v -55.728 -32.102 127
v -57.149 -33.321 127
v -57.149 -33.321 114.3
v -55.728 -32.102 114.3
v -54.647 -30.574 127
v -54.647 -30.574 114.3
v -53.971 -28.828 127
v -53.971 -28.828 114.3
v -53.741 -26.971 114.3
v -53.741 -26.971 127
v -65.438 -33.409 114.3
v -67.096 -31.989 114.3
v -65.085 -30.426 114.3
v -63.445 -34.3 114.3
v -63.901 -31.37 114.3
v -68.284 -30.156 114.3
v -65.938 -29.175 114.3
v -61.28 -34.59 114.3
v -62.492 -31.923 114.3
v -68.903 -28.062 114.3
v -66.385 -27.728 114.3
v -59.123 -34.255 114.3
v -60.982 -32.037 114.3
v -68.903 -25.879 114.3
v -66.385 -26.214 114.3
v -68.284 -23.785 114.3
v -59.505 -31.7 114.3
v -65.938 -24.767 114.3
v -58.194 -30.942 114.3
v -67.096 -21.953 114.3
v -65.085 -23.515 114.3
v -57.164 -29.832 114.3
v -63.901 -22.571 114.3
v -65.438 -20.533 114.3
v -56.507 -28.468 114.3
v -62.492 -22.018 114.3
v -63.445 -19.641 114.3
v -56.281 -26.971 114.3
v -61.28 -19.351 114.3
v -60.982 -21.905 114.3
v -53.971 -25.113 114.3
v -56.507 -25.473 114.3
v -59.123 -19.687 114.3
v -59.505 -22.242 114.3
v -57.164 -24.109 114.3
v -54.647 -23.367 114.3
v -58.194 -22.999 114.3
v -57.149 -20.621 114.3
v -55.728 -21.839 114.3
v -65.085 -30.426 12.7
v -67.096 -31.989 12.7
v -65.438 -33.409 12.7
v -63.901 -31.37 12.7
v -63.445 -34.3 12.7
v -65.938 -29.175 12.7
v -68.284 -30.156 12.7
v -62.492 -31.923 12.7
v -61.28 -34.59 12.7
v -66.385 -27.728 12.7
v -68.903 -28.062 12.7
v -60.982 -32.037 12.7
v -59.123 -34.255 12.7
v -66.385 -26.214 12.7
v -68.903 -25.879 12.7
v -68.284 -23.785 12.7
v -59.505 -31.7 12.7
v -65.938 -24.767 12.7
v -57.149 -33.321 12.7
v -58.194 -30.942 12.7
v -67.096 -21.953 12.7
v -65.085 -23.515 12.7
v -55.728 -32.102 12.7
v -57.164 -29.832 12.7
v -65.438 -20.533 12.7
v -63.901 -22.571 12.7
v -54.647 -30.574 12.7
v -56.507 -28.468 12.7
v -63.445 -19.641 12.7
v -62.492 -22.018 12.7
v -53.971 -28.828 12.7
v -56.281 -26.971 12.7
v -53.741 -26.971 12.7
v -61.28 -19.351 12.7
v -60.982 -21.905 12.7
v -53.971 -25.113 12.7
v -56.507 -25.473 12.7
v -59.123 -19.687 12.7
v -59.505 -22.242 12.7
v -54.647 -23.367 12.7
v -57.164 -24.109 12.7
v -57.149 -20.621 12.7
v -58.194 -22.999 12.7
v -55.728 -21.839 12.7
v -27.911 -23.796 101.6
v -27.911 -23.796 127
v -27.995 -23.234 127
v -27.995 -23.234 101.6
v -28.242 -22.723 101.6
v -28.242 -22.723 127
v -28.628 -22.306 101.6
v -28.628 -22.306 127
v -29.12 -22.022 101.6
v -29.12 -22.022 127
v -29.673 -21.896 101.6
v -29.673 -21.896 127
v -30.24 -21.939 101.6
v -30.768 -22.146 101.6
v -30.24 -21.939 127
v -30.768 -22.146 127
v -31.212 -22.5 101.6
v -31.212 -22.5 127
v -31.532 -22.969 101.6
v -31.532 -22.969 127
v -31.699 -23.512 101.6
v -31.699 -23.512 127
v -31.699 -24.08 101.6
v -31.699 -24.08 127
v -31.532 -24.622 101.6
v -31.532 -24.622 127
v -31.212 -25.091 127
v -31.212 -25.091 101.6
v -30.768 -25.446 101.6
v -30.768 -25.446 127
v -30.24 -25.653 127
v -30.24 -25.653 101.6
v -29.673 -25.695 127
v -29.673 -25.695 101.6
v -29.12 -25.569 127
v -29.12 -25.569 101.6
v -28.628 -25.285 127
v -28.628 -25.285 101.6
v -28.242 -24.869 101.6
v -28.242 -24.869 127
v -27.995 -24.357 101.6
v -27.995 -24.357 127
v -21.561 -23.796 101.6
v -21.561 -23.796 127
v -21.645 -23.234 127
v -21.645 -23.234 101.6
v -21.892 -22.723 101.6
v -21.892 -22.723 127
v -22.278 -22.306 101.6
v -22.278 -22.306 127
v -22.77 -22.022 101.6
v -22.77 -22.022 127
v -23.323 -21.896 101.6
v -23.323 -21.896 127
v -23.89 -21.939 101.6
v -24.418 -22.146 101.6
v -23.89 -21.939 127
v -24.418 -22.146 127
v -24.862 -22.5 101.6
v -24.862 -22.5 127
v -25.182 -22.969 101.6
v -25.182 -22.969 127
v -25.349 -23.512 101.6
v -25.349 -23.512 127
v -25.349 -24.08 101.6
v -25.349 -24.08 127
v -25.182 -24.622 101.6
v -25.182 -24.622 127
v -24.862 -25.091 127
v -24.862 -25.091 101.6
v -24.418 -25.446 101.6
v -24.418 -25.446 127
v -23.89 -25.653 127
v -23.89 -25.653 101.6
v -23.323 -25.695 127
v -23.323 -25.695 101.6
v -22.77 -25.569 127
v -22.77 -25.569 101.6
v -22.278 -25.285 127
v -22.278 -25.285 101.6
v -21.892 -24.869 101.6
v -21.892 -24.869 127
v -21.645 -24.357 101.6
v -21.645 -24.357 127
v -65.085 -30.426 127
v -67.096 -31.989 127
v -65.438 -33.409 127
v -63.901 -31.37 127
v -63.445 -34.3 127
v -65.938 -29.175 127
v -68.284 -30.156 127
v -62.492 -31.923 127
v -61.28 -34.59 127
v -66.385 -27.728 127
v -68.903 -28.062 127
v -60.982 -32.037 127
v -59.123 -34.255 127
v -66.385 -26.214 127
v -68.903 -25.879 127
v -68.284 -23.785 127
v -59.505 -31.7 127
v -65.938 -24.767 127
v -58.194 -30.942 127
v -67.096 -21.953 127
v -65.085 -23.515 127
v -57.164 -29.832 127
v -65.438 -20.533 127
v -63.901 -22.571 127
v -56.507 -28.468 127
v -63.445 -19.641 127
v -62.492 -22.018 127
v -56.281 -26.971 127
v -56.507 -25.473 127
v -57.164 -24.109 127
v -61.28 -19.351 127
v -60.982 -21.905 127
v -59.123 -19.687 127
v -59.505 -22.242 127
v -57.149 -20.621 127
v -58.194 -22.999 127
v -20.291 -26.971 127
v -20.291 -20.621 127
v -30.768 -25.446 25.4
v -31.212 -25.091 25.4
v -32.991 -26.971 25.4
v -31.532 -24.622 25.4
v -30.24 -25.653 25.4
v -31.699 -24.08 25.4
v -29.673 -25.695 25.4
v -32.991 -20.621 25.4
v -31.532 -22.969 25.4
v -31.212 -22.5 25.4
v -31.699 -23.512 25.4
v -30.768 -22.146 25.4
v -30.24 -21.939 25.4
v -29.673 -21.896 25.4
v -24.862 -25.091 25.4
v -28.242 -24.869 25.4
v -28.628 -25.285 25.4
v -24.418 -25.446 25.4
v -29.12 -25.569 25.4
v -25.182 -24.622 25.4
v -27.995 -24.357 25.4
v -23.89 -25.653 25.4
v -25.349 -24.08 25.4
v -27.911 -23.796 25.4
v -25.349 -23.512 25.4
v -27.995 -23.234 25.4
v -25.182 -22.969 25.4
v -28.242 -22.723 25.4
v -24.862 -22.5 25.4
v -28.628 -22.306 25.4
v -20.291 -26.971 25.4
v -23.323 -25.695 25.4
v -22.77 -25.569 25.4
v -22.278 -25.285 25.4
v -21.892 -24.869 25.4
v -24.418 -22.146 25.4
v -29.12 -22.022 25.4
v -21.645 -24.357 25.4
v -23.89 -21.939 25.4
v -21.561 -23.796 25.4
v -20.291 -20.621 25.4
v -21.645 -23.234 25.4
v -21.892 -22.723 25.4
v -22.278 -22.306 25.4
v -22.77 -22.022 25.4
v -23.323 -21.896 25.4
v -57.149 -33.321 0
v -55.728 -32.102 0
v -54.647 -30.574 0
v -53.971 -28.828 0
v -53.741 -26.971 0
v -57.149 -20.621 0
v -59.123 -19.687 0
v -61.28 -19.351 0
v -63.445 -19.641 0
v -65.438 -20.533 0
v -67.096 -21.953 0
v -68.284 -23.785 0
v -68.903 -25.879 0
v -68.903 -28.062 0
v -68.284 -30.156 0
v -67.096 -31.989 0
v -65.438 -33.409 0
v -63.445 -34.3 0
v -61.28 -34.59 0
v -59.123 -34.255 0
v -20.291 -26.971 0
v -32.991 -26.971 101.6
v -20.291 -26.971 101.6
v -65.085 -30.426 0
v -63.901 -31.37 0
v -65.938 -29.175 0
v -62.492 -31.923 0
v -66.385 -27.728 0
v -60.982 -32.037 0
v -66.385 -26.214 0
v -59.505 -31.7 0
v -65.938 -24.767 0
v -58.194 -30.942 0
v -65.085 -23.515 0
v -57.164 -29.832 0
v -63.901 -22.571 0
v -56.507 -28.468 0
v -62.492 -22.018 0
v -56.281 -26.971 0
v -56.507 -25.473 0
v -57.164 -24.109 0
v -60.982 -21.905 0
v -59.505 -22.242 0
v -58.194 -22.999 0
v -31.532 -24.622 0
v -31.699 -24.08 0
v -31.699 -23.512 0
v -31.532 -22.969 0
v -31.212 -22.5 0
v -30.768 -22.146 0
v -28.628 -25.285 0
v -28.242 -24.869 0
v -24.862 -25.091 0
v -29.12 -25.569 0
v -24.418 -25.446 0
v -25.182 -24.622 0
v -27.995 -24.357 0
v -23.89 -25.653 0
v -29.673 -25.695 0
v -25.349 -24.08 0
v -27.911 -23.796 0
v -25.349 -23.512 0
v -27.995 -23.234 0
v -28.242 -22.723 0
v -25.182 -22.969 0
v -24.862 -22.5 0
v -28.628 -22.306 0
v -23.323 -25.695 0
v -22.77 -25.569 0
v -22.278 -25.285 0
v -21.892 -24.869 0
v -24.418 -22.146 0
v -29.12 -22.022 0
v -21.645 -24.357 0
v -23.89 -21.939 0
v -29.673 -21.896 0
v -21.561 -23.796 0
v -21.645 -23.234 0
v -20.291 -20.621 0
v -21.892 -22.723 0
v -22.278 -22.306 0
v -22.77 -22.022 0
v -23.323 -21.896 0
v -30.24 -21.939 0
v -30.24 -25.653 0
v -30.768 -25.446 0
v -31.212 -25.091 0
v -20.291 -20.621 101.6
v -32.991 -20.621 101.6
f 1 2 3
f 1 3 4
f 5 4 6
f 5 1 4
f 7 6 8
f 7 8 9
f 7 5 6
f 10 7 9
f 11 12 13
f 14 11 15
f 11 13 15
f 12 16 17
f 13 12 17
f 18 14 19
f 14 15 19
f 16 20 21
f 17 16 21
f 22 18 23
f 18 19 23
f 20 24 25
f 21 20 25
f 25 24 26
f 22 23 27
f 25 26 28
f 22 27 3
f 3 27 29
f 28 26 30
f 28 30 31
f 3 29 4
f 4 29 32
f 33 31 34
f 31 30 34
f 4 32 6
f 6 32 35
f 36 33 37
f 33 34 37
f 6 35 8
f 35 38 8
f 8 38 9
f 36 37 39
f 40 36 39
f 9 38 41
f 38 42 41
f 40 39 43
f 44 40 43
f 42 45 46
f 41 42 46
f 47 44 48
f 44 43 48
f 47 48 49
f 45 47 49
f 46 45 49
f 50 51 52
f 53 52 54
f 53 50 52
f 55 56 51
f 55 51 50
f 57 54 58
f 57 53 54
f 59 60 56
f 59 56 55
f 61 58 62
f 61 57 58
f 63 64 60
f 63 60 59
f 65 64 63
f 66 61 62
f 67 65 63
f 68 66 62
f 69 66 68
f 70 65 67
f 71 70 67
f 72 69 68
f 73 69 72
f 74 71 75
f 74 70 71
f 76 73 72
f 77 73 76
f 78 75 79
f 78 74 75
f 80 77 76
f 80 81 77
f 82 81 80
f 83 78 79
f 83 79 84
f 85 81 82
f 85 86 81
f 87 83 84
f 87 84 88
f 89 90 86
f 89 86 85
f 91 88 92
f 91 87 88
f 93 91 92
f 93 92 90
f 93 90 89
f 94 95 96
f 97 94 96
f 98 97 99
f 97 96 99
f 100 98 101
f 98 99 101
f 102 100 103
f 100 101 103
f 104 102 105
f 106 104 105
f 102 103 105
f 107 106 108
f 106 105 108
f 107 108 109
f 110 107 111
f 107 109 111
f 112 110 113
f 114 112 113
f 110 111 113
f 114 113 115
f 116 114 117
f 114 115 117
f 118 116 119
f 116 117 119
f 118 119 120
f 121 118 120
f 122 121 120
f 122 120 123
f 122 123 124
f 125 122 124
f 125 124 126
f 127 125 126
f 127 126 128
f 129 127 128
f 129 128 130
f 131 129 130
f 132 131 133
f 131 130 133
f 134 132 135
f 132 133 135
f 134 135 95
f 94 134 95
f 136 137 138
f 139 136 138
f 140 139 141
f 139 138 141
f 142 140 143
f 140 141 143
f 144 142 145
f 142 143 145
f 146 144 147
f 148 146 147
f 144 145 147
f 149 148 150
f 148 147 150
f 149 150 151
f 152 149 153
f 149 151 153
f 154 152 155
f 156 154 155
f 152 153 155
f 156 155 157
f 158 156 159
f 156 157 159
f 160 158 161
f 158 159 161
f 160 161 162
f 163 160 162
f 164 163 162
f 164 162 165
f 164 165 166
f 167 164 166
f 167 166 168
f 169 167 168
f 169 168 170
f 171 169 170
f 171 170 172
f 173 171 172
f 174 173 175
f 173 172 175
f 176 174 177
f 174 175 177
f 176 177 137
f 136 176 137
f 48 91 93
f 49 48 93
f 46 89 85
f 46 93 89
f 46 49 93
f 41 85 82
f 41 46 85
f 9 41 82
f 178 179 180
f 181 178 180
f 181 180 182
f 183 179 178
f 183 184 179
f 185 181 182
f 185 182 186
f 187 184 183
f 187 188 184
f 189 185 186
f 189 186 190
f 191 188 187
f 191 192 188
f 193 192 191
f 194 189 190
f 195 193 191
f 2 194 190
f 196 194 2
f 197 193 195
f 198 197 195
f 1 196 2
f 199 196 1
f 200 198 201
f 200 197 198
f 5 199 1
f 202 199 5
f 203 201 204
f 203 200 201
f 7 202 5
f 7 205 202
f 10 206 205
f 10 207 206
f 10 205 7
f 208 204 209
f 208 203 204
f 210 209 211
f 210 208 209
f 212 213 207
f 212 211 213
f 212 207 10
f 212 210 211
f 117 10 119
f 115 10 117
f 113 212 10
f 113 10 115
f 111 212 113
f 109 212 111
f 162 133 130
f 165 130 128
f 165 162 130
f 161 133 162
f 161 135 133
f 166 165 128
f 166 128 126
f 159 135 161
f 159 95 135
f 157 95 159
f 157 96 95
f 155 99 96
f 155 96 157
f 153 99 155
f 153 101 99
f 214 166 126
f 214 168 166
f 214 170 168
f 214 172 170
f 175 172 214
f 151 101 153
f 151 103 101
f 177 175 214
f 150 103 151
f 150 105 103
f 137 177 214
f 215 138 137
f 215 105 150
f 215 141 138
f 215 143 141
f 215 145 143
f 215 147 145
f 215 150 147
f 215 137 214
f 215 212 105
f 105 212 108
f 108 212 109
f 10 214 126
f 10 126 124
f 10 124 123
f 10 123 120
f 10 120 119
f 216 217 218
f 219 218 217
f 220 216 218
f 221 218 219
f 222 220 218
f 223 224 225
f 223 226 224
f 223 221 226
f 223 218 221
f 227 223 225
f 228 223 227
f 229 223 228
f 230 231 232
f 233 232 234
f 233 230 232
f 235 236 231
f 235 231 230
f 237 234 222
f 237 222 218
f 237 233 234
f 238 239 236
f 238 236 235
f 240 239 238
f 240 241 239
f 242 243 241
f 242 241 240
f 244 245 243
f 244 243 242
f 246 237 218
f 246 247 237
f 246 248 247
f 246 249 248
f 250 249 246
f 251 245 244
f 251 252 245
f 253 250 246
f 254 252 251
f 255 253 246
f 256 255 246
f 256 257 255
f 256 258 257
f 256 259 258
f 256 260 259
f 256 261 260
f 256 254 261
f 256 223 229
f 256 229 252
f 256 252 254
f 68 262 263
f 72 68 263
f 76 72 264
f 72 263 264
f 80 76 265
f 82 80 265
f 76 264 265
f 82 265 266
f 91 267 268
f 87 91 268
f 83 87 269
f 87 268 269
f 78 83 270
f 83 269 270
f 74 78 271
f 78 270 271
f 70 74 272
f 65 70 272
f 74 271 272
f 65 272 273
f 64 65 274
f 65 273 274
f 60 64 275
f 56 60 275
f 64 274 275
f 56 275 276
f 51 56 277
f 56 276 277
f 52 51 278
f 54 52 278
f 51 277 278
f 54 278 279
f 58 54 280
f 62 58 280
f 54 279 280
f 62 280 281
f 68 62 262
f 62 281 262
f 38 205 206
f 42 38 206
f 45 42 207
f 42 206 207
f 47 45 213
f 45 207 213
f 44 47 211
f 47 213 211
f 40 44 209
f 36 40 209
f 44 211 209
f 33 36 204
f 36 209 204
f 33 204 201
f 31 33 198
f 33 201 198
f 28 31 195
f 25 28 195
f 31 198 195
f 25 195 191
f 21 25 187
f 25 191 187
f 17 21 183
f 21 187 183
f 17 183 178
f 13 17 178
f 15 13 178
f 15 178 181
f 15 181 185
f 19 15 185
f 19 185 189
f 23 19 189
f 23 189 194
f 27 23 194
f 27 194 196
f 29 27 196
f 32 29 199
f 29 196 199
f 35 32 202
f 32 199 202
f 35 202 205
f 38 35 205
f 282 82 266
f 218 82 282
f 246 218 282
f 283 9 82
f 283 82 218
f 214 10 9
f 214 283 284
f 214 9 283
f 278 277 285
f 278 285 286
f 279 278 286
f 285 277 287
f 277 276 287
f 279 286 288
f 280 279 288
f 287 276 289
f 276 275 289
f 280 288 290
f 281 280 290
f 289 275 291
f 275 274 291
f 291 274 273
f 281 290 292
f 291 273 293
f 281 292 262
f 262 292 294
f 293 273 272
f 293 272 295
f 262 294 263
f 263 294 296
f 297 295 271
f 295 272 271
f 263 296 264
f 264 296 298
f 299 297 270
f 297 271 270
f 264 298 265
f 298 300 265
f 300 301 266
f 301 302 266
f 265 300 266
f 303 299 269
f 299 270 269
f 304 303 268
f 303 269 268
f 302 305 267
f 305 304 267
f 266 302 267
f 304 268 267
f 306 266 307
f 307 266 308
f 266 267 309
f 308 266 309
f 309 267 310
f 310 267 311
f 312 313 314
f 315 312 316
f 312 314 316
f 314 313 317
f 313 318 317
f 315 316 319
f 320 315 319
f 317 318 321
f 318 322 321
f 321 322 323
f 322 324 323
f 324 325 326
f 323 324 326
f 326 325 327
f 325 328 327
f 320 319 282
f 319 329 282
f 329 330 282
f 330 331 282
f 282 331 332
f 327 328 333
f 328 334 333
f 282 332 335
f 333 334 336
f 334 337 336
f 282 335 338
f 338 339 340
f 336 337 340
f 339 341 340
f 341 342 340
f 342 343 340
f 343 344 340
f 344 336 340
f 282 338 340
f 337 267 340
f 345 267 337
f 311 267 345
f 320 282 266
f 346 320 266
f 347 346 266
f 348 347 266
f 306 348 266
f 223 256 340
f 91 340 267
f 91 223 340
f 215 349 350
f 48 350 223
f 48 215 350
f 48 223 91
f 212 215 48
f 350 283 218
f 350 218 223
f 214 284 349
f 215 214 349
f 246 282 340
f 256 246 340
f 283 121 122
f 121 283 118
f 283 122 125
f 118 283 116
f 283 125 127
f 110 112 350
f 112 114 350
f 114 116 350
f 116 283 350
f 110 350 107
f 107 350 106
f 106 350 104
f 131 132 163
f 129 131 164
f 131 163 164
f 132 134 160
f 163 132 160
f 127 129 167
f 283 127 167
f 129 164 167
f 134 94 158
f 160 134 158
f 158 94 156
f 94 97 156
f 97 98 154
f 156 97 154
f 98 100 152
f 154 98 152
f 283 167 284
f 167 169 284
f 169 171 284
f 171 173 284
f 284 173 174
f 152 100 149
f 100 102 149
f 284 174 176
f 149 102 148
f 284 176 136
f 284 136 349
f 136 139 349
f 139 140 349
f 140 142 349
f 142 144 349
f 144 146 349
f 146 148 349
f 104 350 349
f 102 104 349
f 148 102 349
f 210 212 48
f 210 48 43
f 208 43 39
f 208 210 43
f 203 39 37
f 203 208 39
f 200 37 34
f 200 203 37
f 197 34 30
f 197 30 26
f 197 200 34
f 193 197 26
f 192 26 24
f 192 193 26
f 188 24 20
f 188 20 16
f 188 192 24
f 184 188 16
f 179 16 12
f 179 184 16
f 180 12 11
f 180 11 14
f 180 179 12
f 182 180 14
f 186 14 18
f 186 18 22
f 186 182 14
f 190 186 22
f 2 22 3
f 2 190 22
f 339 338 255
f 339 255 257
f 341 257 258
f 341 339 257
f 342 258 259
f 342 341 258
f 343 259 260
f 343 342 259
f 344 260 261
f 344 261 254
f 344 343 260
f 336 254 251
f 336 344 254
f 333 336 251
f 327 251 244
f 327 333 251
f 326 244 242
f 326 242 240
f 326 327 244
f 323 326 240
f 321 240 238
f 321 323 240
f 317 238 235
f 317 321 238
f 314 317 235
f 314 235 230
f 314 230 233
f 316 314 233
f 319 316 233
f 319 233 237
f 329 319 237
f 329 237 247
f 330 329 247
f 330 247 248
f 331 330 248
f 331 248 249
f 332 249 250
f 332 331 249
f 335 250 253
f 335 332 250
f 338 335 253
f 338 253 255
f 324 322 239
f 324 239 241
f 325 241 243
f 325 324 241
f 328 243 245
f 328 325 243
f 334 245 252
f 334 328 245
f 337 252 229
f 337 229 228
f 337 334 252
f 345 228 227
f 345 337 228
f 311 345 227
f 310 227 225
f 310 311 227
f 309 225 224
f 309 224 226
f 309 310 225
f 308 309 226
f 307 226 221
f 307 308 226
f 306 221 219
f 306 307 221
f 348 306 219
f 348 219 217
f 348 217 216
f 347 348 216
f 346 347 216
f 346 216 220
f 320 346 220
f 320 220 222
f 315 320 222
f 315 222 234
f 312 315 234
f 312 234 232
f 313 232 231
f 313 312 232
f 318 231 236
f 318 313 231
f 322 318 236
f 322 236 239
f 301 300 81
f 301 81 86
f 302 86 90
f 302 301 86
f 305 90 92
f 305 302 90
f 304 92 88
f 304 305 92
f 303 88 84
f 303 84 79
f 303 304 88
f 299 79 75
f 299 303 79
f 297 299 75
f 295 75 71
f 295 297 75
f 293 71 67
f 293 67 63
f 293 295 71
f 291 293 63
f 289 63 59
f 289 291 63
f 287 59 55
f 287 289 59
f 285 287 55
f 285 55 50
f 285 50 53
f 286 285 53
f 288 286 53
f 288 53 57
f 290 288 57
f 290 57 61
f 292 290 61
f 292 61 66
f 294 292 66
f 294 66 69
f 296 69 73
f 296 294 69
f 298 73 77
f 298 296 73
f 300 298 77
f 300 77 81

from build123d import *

# Parameters (mm, degrees)
F0_R     = 5.08
F1_DEPTH = 12.7
F0_W     = 6.35
F0_H     = 6.35
F0_R_2   = 1.905
F2_DEPTH = 25.4
F3_DEPTH = 63.5


with BuildPart() as f1:
    # F0 (on Top) → F1 (new body)
    with BuildSketch(Plane.XY):
        with BuildLine():
            ThreePointArc((-57.1493167461, -20.6207571715), (-68.9814302299, -26.9707571715), (-57.1493167461, -33.3207571715))
            ThreePointArc((-57.1493167461, -33.3207571715), (-54.6472398563, -30.5740955718), (-53.7414302299, -26.9707571715))
            ThreePointArc((-53.7414302299, -26.9707571715), (-54.6472398563, -23.3674187712), (-57.1493167461, -20.6207571715))
        make_face()
        with Locations((-61.3614302299, -26.9707571715)):
            Circle(F0_R, mode=Mode.SUBTRACT)
    extrude(amount=F1_DEPTH)

    # F0 (on Top) → F2 (join)
    with BuildSketch(Plane.XY):
        with BuildLine():
            Line((-53.7414302299, -26.9707571715), (-32.9907516612, -26.9707571715))
            Line((-32.9907516612, -26.9707571715), (-32.9907516612, -20.6207571715))
            Line((-32.9907516612, -20.6207571715), (-57.1493167461, -20.6207571715))
            ThreePointArc((-57.1493167461, -20.6207571715), (-54.6472398563, -23.3674187712), (-53.7414302299, -26.9707571715))
        make_face()
        with Locations((-23.4657516612, -23.7957571715)):
            Rectangle(F0_W, F0_H)
        with Locations((-23.4657516612, -23.7957571715)):
            Circle(F0_R_2, mode=Mode.SUBTRACT)
        with Locations((-29.8157516612, -23.7957571715)):
            Rectangle(F0_W, F0_H)
        with Locations((-29.8157516612, -23.7957571715)):
            Circle(F0_R_2, mode=Mode.SUBTRACT)
    extrude(amount=F2_DEPTH)

    # F0 (on Top) → F3 (join)
    with BuildSketch(Plane.XY):
        with BuildLine():
            Line((-53.7414302299, -26.9707571715), (-32.9907516612, -26.9707571715))
            Line((-32.9907516612, -26.9707571715), (-32.9907516612, -20.6207571715))
            Line((-32.9907516612, -20.6207571715), (-57.1493167461, -20.6207571715))
            ThreePointArc((-57.1493167461, -20.6207571715), (-54.6472398563, -23.3674187712), (-53.7414302299, -26.9707571715))
        make_face()
    extrude(amount=F3_DEPTH)

    # F4: F1 across face


with BuildPart() as f1_1:
    add(f1.part)
    add(f1.part.mirror(Plane(origin=(-43.8925069162, -23.7183782797, 63.5), x_dir=(1, 0, 0), z_dir=(0, 0, 1))))


solid = f1_1.part
